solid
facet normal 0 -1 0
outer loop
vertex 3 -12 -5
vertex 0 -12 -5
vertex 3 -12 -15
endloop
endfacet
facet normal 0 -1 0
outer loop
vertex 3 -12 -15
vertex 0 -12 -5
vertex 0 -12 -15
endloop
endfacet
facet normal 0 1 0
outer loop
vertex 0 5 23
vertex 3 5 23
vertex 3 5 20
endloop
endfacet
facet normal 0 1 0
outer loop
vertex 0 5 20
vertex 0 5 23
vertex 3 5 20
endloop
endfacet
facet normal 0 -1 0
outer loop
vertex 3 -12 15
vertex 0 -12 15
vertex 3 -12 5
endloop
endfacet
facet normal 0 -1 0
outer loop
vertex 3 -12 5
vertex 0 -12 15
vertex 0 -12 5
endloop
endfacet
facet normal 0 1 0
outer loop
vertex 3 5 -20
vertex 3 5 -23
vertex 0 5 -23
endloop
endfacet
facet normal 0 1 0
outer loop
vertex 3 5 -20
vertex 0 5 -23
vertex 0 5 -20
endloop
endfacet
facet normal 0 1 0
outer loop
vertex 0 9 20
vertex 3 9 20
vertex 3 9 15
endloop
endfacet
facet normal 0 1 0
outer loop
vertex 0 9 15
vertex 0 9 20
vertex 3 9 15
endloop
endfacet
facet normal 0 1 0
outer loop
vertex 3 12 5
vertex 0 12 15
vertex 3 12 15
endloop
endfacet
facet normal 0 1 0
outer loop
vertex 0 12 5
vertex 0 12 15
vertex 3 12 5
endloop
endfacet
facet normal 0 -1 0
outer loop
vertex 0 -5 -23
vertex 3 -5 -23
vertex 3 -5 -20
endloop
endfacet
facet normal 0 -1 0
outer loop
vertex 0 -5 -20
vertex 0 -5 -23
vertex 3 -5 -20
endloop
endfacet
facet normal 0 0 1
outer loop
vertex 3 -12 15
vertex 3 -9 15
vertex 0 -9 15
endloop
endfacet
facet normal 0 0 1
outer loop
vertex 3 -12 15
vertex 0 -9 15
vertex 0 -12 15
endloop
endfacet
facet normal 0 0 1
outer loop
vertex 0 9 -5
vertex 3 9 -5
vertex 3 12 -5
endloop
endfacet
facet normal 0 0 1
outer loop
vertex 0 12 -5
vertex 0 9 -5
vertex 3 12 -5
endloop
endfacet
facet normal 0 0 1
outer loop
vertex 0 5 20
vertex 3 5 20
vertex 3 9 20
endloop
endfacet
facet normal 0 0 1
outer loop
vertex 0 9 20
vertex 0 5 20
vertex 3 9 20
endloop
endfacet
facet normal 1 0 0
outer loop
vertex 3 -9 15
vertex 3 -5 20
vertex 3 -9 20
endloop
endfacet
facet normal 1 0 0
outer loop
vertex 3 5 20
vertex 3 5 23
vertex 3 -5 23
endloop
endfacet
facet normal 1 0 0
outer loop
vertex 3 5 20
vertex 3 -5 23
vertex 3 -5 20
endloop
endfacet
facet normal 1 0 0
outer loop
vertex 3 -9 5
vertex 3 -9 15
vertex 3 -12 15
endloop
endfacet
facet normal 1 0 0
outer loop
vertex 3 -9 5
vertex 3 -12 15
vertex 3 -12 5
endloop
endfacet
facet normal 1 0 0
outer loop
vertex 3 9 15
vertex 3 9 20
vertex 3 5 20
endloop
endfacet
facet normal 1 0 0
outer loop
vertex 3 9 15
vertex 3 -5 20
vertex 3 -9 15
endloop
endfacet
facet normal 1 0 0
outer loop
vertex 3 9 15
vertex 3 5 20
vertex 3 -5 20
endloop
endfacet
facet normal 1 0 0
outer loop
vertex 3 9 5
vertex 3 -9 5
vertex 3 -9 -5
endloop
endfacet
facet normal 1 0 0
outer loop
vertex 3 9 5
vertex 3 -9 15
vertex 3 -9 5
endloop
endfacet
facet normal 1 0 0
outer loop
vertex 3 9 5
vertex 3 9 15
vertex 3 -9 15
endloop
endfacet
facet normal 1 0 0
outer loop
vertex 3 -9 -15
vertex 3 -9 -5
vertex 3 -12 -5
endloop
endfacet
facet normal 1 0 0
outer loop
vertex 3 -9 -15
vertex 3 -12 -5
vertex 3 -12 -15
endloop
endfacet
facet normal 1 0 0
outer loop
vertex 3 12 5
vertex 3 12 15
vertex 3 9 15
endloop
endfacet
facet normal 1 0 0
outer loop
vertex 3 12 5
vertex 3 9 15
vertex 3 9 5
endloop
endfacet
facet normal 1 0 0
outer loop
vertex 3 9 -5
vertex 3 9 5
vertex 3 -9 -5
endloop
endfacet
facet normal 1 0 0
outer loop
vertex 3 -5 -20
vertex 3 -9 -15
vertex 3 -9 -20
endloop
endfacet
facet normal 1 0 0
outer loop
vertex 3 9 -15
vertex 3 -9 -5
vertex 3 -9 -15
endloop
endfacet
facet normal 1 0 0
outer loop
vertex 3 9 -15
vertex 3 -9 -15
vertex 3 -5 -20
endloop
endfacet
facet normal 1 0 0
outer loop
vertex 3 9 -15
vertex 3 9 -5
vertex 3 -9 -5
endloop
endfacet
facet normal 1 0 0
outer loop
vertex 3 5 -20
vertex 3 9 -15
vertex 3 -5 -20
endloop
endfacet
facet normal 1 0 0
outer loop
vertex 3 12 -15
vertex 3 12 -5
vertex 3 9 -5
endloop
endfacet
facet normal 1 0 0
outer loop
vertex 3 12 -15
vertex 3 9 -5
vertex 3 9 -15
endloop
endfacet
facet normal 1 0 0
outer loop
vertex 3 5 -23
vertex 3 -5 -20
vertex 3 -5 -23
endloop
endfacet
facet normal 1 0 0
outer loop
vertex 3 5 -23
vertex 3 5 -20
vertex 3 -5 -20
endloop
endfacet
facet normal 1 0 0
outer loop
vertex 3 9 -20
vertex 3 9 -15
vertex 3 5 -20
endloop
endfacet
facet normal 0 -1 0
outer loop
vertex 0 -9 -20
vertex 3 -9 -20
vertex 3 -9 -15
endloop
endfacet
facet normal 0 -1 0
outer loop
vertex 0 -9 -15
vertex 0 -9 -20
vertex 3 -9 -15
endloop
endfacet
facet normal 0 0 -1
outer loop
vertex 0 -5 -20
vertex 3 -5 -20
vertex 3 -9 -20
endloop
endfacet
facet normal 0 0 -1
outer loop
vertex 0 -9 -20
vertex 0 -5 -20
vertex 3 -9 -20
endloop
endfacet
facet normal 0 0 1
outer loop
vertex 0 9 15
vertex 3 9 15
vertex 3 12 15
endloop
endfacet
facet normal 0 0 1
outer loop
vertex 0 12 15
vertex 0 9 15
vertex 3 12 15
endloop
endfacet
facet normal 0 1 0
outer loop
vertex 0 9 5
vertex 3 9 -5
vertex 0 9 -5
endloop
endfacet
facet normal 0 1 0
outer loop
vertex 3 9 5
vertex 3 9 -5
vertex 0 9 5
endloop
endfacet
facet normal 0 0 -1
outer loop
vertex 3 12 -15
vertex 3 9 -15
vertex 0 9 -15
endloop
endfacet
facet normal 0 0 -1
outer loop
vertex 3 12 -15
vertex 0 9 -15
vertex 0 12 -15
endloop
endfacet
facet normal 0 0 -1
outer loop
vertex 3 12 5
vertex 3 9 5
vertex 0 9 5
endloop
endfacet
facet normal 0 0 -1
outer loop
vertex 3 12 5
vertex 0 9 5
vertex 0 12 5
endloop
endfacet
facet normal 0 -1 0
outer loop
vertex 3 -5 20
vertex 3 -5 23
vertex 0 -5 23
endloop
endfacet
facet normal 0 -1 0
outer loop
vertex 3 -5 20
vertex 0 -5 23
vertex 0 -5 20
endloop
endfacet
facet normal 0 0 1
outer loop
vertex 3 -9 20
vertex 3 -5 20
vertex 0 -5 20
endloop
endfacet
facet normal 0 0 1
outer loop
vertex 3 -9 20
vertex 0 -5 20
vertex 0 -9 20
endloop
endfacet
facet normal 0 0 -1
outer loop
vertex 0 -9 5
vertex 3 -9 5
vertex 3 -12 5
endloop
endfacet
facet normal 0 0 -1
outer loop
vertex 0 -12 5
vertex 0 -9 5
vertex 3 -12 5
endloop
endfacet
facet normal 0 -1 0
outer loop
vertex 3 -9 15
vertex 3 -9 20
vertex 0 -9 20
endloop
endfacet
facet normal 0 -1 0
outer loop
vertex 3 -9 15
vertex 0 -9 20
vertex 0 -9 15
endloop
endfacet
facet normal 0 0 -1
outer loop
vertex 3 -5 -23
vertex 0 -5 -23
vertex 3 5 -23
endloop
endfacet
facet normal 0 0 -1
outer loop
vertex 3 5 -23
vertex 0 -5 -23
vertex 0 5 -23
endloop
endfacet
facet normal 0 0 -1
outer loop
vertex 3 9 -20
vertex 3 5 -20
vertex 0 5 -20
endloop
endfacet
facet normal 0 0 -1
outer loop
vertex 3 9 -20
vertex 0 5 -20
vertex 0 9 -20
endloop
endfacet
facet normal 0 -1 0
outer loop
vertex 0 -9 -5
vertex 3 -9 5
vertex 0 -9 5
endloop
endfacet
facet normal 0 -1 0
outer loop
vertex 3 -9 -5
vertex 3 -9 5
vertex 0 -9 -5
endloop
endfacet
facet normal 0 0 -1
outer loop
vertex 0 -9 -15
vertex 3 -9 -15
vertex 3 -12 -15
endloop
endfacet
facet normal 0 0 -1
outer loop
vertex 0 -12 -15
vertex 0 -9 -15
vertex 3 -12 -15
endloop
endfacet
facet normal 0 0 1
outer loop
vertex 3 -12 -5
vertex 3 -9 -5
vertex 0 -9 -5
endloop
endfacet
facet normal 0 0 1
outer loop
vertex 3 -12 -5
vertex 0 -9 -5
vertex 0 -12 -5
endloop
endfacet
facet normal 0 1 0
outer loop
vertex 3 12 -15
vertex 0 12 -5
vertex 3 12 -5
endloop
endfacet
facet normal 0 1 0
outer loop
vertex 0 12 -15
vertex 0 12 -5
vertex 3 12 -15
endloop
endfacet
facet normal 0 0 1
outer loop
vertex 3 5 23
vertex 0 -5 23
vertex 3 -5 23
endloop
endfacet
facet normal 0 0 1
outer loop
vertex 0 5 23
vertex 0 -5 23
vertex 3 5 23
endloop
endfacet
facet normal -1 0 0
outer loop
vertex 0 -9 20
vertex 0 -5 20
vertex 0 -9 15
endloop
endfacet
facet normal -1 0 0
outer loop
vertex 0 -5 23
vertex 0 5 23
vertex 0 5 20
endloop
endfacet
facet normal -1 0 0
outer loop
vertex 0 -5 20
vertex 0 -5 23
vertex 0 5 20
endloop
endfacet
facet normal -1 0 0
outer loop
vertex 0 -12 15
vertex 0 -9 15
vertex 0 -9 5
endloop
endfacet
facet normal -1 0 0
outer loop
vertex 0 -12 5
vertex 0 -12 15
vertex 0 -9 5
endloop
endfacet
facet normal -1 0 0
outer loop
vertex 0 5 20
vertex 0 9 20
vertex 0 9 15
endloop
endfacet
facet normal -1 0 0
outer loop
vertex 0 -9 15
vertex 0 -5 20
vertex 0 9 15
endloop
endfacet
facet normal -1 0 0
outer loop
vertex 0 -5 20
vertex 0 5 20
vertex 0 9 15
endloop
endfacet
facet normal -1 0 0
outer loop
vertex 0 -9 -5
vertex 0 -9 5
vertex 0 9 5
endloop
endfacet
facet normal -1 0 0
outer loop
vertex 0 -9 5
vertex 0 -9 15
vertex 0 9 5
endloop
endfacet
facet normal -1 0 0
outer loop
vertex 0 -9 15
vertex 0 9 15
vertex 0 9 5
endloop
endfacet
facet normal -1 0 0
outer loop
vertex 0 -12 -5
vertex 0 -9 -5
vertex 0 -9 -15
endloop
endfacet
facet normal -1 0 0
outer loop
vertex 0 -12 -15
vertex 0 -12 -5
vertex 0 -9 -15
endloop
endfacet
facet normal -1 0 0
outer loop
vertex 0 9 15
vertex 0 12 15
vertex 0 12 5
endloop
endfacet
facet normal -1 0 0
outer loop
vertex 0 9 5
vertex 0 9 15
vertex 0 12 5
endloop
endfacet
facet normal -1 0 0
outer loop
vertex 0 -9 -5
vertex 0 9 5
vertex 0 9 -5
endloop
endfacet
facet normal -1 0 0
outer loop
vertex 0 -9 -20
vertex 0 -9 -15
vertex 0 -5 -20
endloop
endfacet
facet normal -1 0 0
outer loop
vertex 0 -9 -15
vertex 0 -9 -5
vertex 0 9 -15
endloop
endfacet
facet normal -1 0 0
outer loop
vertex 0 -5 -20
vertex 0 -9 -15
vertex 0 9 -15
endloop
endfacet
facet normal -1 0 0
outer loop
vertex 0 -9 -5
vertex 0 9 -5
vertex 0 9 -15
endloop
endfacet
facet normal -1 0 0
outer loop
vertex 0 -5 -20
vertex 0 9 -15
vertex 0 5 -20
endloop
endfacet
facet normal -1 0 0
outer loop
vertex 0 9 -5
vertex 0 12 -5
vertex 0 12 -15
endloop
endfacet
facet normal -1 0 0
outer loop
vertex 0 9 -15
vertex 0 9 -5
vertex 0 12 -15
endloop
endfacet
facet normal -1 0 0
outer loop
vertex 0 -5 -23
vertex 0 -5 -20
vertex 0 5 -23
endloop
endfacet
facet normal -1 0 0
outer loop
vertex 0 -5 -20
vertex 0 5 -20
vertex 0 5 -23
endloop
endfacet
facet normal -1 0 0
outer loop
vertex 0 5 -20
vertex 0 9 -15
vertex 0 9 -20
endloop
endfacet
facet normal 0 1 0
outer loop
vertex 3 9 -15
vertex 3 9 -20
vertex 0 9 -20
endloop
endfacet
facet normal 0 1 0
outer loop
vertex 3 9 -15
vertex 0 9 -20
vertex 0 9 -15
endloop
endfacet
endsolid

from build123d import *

# Parameters (mm, degrees)
SKETCH1_W               = 46
SKETCH1_H               = 24
BOSS_EXTRUDE1_DEPTH     = 3
SKETCH2_W               = 5
SKETCH2_H               = 3
CUT_EXTRUDE1_DEPTH      = 4
MIRROR2_COPY_1_SKETCH_W = 5
MIRROR2_COPY_1_SKETCH_H = 3
MIRROR2_COPY_1_DEPTH    = 4


with BuildPart() as part:
    # Sketch1 → Boss-Extrude1 (new body)
    with BuildSketch(Plane(origin=(0, 0, 0), x_dir=(0, 0, -1), z_dir=(1, 0, 0))):
        Rectangle(SKETCH1_W, SKETCH1_H)
    extrude(amount=BOSS_EXTRUDE1_DEPTH)

    # Sketch2 → Cut-Extrude1 (cut, through all)
    with BuildSketch(Plane(origin=(3, 0, 0), x_dir=(0, 0, -1), z_dir=(1, 0, 0))):
        Polygon((23, 5), (20, 5), (20, 9), (15, 9), (15, 12), (23, 12), align=None)
        with Locations((2.5, 10.5)):
            Rectangle(SKETCH2_W, SKETCH2_H)
    cut_extrude1 = extrude(amount=-CUT_EXTRUDE1_DEPTH, mode=Mode.SUBTRACT)

    # Mirror1: Cut-Extrude1 across plane
    add(cut_extrude1.mirror(Plane.ZX), mode=Mode.SUBTRACT)

    # Mirror2: Cut-Extrude1 across plane
    add(cut_extrude1.mirror(Plane.XY), mode=Mode.SUBTRACT)

    # Mirror2 copy 1 sketch → Mirror2 copy 1 (cut, through all)
    with BuildSketch(Plane(origin=(3, 0, 0), x_dir=(0, 0, 1), z_dir=(1, 0, 0))):
        Polygon((23, 5), (20, 5), (20, 9), (15, 9), (15, 12), (23, 12), align=None)
        with Locations((2.5, 10.5)):
            Rectangle(MIRROR2_COPY_1_SKETCH_W, MIRROR2_COPY_1_SKETCH_H)
    extrude(amount=-MIRROR2_COPY_1_DEPTH, mode=Mode.SUBTRACT)


solid = part.part
